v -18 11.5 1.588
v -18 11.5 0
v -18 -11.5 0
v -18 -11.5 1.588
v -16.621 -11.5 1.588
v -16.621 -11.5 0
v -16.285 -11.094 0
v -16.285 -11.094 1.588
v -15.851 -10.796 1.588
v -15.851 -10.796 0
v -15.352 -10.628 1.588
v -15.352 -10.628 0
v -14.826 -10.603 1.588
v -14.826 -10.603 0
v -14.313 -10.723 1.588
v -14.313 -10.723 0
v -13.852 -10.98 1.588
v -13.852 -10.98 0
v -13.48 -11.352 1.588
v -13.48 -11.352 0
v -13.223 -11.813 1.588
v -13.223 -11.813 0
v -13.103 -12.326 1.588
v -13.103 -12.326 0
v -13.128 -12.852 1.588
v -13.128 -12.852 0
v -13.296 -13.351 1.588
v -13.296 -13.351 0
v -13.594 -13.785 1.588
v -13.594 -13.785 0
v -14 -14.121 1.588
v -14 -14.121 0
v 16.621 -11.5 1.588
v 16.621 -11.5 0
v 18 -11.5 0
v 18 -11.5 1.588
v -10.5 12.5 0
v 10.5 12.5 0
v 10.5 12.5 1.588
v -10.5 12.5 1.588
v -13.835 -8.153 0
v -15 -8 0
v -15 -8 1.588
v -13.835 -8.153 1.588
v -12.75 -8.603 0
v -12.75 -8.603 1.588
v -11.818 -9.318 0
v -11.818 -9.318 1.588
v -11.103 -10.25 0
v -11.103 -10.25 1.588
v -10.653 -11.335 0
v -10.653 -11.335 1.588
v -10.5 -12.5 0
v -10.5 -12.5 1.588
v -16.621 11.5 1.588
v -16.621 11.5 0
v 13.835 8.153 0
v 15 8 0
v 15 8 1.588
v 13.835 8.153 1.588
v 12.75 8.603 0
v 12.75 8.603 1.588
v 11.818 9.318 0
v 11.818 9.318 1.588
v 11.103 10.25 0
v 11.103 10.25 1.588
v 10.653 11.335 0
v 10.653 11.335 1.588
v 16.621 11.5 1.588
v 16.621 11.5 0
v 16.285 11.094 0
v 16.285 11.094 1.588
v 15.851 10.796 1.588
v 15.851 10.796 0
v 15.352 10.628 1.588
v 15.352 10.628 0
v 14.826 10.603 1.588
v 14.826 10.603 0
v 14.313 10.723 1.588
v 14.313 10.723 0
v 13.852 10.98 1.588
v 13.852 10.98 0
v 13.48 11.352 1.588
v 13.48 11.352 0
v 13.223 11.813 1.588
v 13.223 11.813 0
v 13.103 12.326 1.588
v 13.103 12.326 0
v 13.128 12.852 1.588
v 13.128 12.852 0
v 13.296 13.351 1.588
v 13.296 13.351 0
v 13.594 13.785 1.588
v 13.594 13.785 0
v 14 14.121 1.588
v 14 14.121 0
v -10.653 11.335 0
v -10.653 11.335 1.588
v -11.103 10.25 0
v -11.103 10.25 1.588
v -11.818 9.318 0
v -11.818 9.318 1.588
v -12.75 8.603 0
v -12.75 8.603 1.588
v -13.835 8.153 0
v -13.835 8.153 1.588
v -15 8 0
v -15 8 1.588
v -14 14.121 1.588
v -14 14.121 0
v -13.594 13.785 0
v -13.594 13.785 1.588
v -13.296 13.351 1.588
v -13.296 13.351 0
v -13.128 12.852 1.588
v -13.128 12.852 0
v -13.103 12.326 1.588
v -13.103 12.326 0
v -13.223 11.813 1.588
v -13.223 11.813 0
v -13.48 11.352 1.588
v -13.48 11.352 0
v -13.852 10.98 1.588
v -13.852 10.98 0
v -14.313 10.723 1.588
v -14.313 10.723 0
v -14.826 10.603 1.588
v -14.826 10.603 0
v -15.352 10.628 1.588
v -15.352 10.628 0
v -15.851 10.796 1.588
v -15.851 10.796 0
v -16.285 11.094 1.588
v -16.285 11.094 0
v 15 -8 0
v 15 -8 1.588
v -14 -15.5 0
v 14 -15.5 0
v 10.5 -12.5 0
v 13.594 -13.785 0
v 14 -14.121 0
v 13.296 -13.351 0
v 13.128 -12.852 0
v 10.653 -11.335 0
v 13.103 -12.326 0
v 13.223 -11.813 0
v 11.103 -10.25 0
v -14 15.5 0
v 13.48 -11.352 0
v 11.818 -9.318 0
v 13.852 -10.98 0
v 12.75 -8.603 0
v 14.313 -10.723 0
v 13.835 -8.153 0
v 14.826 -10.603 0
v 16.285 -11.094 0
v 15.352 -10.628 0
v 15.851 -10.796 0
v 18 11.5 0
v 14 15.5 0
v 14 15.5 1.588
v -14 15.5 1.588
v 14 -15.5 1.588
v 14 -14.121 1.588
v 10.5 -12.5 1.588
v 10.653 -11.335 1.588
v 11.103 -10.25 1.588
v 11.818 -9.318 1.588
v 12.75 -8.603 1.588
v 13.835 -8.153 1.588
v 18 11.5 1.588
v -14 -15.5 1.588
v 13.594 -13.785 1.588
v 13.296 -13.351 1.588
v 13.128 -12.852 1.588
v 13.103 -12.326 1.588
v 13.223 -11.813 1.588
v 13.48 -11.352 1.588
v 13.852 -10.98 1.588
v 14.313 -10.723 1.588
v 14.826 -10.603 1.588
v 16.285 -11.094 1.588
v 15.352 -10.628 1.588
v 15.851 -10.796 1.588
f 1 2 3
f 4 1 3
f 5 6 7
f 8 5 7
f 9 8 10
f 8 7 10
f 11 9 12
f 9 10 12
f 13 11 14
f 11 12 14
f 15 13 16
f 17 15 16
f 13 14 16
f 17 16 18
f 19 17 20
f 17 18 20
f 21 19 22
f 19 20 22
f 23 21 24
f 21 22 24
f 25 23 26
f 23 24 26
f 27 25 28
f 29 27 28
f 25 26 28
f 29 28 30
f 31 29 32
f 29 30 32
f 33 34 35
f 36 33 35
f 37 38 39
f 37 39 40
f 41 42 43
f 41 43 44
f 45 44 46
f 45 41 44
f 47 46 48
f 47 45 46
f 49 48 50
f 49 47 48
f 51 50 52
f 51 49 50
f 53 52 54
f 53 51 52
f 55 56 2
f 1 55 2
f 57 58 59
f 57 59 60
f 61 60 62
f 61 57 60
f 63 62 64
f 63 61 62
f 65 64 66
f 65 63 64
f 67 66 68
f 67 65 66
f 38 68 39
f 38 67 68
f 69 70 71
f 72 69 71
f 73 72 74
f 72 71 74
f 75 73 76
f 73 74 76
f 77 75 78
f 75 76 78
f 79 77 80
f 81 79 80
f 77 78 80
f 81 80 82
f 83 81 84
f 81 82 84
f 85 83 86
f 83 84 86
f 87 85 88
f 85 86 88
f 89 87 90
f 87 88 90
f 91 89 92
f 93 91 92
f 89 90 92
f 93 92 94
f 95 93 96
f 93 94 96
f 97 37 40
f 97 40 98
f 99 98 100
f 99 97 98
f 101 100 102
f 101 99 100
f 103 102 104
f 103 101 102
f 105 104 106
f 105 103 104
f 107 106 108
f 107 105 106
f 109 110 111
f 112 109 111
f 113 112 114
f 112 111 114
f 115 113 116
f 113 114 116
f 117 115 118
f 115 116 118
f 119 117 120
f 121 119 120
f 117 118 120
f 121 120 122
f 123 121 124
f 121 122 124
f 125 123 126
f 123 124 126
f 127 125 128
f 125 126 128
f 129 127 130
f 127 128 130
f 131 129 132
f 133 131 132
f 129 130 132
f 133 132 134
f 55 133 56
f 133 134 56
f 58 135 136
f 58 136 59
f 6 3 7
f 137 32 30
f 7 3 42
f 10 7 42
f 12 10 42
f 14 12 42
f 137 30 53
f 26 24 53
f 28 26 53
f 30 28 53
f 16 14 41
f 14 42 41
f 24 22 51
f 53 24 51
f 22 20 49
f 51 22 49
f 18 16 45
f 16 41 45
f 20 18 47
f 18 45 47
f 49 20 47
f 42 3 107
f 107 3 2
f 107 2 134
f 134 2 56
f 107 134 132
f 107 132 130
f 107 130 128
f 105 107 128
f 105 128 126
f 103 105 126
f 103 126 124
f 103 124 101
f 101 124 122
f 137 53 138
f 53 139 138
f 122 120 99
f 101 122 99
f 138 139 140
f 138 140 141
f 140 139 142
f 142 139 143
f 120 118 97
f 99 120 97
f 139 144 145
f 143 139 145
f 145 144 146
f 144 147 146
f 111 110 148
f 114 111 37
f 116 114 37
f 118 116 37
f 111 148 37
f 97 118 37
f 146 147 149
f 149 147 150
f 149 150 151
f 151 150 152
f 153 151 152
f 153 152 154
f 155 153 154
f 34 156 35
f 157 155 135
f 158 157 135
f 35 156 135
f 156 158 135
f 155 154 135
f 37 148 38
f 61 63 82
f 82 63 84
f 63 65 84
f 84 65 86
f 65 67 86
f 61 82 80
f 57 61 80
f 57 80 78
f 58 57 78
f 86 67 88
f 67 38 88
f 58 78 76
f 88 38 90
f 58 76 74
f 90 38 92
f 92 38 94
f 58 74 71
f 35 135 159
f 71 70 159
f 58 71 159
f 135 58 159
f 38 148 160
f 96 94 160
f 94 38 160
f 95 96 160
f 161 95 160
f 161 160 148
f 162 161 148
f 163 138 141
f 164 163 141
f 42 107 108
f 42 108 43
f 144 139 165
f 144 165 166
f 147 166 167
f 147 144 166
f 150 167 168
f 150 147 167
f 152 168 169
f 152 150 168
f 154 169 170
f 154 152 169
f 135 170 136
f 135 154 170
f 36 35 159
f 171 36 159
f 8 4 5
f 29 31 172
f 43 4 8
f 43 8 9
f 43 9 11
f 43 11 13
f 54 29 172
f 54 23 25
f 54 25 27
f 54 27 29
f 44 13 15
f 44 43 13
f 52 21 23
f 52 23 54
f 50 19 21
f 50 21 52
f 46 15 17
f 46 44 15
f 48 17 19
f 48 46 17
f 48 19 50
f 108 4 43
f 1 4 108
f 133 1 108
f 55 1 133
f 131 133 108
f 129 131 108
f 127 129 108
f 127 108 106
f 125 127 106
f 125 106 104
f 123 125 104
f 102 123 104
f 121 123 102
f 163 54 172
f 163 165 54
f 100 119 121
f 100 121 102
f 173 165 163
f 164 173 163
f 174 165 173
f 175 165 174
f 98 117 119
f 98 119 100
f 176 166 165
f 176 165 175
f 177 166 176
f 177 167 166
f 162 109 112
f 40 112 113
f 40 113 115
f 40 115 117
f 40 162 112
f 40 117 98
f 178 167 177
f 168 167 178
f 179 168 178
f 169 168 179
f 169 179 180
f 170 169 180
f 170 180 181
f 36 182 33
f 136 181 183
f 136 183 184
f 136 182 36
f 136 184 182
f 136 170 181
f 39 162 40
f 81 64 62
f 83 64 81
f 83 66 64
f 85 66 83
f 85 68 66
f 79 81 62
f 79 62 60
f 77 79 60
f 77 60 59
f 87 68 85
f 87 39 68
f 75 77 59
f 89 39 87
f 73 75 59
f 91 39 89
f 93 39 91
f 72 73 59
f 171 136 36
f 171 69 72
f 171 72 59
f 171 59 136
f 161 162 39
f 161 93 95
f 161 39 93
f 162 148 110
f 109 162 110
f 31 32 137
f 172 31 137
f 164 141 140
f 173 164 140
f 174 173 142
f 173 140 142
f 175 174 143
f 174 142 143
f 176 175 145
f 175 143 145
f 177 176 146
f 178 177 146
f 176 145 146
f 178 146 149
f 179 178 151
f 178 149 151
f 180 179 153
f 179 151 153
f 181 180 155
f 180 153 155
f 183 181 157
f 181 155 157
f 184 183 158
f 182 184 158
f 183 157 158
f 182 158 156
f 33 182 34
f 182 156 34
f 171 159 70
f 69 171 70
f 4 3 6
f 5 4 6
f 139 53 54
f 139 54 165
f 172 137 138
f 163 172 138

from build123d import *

# Parameters (mm, degrees)
BOSS_EXTRUDE1_DEPTH = 1.5875


with BuildPart() as part:
    # Sketch1 → Boss-Extrude1 (new body)
    with BuildSketch(Plane.XY):
        with BuildLine():
            Line((-18, 11.5), (-18, -11.5))
            Line((-18, -11.5), (-16.621426841, -11.5))
            ThreePointArc((-16.621426841, -11.5), (-13.652961582, -11.152961582), (-14, -14.121426841))
            Line((-14, -14.121426841), (-14, -15.5))
            Line((-14, -15.5), (14, -15.5))
            Line((14, -15.5), (14, -14.121426841))
            ThreePointArc((14, -14.121426841), (13.652961582, -11.152961582), (16.621426841, -11.5))
            Line((16.621426841, -11.5), (18, -11.5))
            Line((18, -11.5), (18, 11.5))
            Line((18, 11.5), (16.621426841, 11.5))
            ThreePointArc((16.621426841, 11.5), (13.652961582, 11.152961582), (14, 14.121426841))
            Line((14, 14.121426841), (14, 15.5))
            Line((14, 15.5), (-14, 15.5))
            Line((-14, 15.5), (-14, 14.121426841))
            ThreePointArc((-14, 14.121426841), (-13.652961582, 11.152961582), (-16.621426841, 11.5))
            Line((-16.621426841, 11.5), (-18, 11.5))
        make_face()
        with BuildLine():
            Line((-15, 8), (-15, -8))
            ThreePointArc((-15, -8), (-11.818019485, -9.318019485), (-10.5, -12.5))
            Line((-10.5, -12.5), (10.5, -12.5))
            ThreePointArc((10.5, -12.5), (11.818019485, -9.318019485), (15, -8))
            Line((15, -8), (15, 8))
            ThreePointArc((15, 8), (11.818019485, 9.318019485), (10.5, 12.5))
            Line((10.5, 12.5), (-10.5, 12.5))
            ThreePointArc((-10.5, 12.5), (-11.818019485, 9.318019485), (-15, 8))
        make_face(mode=Mode.SUBTRACT)
    extrude(amount=BOSS_EXTRUDE1_DEPTH)


solid = part.part
